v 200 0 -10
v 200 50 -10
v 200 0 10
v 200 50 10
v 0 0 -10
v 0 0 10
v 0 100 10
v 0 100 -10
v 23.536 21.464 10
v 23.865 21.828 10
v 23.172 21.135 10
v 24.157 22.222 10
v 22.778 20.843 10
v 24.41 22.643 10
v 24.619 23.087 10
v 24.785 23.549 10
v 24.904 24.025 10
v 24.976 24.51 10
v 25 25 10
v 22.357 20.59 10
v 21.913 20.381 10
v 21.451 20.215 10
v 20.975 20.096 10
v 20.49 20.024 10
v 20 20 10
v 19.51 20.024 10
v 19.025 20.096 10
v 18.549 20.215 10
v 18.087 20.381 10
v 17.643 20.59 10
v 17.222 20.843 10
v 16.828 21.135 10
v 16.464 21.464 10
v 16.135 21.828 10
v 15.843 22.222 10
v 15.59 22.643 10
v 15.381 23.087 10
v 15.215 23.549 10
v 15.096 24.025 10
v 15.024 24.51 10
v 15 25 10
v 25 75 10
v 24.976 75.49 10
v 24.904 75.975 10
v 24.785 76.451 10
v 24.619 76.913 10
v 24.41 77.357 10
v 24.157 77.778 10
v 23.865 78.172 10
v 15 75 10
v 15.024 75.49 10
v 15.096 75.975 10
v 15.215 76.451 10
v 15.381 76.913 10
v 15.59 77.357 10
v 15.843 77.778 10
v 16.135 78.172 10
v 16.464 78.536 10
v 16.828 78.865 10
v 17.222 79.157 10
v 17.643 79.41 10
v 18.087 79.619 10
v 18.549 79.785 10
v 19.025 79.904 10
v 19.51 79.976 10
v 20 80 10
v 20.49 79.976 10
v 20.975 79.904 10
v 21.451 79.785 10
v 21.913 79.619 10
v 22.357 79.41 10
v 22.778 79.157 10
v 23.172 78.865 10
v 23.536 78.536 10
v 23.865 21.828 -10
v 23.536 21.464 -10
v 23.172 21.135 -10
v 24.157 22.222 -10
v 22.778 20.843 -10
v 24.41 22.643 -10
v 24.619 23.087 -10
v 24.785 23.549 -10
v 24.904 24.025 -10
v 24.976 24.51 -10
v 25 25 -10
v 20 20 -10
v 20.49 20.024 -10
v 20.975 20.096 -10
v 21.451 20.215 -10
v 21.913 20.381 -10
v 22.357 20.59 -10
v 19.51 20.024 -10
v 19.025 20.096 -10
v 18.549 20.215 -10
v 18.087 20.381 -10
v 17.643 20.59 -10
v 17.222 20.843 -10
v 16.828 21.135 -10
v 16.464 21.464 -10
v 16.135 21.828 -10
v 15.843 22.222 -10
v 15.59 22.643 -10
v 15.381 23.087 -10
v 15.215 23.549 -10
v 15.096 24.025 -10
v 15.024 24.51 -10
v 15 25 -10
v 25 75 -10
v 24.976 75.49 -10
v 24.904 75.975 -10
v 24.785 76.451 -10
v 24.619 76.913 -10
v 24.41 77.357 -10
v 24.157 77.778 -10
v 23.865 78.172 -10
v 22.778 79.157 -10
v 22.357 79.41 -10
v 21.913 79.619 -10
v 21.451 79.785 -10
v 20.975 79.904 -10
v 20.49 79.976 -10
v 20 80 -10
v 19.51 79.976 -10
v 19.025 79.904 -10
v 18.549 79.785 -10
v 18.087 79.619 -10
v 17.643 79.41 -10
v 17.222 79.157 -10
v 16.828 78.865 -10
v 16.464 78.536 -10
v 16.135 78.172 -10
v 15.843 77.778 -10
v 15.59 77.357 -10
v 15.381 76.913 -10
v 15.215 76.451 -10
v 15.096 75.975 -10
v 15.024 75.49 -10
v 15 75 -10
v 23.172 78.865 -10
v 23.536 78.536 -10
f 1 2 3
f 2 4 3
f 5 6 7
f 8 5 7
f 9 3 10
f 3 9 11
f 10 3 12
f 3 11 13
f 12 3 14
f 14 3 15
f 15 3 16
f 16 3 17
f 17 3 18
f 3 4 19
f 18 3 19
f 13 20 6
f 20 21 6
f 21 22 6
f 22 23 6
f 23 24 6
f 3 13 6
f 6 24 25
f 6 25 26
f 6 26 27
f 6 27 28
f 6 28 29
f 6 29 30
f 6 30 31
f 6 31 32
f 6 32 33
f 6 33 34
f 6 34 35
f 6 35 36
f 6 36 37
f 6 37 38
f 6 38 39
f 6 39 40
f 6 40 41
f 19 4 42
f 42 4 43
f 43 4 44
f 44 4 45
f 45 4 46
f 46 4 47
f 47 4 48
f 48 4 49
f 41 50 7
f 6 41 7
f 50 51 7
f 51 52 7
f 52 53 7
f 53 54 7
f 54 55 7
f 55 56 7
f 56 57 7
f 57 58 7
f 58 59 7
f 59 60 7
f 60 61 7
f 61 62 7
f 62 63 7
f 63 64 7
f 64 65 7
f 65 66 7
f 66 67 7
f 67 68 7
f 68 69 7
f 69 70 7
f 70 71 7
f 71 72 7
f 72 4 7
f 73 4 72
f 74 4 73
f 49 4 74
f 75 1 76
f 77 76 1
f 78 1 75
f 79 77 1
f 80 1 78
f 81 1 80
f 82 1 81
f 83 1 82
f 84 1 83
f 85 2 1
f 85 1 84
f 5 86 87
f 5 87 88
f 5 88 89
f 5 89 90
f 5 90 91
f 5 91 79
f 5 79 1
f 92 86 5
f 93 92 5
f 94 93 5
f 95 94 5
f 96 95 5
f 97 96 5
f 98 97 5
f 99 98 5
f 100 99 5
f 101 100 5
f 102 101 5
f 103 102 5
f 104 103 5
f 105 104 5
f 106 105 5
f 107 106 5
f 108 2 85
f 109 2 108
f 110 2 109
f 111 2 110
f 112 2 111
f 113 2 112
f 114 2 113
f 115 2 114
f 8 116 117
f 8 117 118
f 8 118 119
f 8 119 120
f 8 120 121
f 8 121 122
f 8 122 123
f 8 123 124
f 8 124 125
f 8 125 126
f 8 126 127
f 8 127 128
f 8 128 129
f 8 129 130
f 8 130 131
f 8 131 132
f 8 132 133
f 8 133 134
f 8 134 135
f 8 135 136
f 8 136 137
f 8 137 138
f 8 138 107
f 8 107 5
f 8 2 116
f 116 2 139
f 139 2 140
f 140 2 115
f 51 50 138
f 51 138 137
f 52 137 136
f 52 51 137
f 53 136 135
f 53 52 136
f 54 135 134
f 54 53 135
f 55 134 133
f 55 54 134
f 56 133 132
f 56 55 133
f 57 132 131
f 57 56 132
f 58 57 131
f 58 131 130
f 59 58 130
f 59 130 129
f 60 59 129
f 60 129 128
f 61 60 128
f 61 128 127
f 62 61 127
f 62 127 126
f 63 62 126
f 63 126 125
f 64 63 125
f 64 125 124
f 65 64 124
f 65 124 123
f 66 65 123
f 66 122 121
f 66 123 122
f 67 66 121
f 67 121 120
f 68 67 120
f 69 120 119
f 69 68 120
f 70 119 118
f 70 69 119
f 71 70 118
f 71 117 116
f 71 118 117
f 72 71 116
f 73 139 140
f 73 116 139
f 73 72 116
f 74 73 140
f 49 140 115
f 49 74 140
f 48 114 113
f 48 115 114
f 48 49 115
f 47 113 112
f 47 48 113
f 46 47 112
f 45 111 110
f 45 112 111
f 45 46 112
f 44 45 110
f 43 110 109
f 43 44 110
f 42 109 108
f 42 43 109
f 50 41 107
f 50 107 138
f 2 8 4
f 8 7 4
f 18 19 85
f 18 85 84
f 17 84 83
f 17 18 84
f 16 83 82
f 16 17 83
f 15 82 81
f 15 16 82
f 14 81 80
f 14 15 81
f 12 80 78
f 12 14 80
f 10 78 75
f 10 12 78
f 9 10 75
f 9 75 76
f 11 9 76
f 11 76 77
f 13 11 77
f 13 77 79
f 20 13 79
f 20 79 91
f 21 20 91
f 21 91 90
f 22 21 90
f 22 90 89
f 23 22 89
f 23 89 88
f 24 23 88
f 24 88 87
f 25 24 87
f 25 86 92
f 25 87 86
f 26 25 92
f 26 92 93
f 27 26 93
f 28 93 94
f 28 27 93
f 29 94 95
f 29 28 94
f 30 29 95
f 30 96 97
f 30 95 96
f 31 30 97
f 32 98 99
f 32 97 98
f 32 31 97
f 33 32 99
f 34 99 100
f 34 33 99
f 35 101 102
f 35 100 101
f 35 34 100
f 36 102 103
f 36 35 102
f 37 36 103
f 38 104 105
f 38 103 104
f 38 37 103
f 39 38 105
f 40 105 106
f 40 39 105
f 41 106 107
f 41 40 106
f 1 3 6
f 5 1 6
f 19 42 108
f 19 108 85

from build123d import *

# Parameters (mm, degrees)
AUFSATZ_LINEAR_AUSTRAGEN1_DEPTH = 10
SCHNITT_LINEAR_AUSTRAGEN1_DEPTH = 21


with BuildPart() as part:
    # Skizze1 → Aufsatz-Linear austragen1 (new body, symmetric)
    with BuildSketch(Plane.XY):
        Polygon((0, 0), (0, 100), (200, 50), (200, 0), align=None)
    extrude(amount=AUFSATZ_LINEAR_AUSTRAGEN1_DEPTH, both=True)

    # Skizze2 → Schnitt-Linear austragen1 (cut, through all)
    with BuildSketch(Plane.XY.offset(10)):
        with BuildLine():
            Line((15, 25), (15, 75))
            ThreePointArc((15, 75), (20, 80), (25, 75))
            Line((25, 75), (25, 25))
            ThreePointArc((25, 25), (20, 20), (15, 25))
        make_face()
    extrude(amount=-SCHNITT_LINEAR_AUSTRAGEN1_DEPTH, mode=Mode.SUBTRACT)


solid = part.part
